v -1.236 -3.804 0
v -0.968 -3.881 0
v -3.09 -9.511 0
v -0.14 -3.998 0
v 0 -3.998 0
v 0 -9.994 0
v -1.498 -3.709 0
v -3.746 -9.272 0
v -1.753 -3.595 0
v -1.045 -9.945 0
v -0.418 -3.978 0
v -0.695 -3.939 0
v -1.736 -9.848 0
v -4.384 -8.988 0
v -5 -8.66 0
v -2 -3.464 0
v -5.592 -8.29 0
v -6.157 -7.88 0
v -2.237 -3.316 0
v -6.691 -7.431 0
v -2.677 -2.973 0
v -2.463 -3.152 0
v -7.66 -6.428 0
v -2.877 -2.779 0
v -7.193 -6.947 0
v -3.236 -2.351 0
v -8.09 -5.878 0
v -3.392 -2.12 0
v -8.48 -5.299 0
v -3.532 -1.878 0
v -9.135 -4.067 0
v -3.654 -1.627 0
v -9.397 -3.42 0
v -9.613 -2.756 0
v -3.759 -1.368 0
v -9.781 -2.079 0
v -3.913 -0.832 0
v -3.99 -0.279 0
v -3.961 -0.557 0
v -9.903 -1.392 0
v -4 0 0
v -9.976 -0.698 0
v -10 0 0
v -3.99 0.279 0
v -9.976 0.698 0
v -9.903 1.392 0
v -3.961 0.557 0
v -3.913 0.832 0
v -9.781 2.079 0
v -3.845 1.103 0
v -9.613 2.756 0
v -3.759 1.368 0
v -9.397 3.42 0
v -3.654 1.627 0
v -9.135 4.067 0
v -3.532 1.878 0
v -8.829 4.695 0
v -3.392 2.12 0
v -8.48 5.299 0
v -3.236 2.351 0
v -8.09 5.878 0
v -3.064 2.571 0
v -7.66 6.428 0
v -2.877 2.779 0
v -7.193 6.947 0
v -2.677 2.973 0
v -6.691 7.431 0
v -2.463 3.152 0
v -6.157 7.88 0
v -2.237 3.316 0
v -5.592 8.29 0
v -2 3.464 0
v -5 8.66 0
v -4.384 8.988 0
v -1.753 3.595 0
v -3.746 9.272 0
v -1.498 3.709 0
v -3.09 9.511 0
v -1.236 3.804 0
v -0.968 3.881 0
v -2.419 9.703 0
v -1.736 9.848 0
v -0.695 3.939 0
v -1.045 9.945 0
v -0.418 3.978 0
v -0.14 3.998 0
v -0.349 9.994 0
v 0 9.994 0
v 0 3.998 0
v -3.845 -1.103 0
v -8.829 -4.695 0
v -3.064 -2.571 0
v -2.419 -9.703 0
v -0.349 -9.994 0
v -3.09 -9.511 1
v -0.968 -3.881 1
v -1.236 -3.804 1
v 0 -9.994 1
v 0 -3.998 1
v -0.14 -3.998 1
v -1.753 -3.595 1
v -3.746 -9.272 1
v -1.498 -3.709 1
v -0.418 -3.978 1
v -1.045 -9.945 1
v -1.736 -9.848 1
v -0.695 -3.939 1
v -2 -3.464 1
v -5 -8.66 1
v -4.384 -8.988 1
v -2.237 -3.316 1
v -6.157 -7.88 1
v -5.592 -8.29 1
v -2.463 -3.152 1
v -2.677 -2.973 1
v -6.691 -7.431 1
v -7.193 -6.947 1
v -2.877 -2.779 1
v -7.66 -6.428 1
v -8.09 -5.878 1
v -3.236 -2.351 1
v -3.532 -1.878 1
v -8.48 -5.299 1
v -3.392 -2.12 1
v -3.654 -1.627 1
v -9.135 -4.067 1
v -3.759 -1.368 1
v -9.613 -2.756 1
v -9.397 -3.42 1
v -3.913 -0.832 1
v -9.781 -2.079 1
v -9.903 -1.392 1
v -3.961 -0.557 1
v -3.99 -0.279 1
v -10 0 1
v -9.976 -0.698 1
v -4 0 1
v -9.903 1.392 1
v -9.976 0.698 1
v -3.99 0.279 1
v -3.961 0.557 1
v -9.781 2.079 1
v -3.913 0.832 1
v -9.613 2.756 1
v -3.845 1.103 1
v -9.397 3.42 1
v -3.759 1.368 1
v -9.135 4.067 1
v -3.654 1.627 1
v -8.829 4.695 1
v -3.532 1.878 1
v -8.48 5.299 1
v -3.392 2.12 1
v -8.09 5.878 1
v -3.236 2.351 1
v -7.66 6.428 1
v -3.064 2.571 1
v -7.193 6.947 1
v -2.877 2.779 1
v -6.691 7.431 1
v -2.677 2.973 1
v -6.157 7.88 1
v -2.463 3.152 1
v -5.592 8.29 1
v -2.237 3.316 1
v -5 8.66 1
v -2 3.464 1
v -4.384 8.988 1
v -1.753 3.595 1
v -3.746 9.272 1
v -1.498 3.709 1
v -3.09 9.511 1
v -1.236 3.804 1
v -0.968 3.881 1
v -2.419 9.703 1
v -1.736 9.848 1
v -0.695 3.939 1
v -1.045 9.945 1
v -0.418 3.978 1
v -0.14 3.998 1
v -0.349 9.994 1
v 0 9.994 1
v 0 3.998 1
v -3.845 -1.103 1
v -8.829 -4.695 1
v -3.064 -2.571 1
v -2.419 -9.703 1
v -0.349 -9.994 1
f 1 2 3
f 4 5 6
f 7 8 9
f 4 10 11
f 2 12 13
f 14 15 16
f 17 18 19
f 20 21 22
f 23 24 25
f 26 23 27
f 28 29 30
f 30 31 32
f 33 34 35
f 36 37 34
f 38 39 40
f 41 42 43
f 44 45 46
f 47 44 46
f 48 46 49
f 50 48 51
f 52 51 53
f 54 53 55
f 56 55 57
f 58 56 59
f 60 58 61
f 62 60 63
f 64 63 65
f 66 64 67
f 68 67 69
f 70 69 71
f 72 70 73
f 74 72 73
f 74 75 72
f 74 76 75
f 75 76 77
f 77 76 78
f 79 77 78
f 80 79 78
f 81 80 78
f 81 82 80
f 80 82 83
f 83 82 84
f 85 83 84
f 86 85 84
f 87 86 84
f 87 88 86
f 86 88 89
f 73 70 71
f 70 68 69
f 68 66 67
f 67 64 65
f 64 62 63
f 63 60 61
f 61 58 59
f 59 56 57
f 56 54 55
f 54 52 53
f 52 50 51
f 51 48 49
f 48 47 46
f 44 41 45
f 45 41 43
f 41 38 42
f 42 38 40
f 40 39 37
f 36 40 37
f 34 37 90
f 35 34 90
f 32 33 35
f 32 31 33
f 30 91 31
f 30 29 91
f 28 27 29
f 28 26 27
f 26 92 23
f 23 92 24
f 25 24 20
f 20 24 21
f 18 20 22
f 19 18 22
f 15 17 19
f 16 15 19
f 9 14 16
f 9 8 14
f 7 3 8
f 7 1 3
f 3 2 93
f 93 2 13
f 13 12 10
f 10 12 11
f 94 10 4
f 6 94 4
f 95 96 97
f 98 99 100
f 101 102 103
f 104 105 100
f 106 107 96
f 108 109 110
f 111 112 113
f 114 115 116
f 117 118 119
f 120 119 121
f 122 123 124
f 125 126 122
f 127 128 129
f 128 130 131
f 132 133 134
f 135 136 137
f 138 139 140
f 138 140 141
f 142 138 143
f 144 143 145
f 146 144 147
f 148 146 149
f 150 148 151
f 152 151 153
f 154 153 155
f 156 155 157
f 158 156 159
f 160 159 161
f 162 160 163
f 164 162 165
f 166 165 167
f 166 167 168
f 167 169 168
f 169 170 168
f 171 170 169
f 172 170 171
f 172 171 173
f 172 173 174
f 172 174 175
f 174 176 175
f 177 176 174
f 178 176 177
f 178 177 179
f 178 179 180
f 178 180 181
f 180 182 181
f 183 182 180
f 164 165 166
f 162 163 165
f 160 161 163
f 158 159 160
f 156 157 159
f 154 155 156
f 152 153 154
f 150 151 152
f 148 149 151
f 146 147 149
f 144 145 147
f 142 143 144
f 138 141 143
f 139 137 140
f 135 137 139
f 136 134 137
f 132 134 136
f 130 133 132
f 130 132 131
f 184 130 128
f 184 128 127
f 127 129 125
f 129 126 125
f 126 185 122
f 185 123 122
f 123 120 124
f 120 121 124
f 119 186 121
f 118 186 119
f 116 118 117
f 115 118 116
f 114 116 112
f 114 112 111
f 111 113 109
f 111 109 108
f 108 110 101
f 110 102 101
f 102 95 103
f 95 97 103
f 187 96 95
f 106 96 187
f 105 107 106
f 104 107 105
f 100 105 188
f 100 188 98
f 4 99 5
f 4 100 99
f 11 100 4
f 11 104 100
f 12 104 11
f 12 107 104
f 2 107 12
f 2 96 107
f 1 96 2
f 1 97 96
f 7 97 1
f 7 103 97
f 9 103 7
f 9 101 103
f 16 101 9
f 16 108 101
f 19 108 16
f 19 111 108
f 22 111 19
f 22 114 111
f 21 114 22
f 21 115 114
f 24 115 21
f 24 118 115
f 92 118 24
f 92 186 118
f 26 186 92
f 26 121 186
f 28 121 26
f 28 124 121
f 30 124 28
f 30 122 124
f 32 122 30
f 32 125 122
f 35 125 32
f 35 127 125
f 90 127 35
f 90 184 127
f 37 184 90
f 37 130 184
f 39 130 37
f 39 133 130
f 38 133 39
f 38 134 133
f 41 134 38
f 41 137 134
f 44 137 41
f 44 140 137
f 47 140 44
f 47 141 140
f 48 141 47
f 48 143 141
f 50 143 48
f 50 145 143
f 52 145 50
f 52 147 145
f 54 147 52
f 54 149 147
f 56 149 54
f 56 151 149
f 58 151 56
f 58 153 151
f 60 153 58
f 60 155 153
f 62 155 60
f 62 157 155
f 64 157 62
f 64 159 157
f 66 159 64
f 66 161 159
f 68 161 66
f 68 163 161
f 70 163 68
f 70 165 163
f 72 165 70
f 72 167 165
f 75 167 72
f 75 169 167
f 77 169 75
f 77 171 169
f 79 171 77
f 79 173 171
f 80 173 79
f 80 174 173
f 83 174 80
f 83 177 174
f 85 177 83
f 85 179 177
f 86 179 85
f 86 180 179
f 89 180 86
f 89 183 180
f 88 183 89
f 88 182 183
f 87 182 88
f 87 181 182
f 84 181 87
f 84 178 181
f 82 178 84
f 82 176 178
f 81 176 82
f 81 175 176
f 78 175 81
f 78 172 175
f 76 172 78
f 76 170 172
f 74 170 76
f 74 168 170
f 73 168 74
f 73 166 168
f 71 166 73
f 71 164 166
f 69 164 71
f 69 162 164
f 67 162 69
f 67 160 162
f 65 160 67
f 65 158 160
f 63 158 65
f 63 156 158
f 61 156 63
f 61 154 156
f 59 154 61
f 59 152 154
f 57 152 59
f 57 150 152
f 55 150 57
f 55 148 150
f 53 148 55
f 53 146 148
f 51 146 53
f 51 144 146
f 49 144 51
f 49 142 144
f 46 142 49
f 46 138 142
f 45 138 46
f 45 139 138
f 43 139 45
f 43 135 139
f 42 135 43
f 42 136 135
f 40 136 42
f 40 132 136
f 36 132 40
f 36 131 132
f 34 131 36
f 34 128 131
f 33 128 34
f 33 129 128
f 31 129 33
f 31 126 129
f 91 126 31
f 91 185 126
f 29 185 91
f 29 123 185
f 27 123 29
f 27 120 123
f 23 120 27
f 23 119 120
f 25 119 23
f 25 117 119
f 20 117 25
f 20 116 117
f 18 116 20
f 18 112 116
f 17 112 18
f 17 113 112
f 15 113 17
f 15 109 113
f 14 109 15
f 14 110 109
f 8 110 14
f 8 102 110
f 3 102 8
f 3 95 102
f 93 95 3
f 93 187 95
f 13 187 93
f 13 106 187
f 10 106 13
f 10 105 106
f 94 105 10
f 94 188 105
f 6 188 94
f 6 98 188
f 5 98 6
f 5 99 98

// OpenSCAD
$fn = 90;

linear_extrude(1)
difference() {
  circle(r=10);
  circle(r=4);
  translate([0, -50])
    square(100);
}
